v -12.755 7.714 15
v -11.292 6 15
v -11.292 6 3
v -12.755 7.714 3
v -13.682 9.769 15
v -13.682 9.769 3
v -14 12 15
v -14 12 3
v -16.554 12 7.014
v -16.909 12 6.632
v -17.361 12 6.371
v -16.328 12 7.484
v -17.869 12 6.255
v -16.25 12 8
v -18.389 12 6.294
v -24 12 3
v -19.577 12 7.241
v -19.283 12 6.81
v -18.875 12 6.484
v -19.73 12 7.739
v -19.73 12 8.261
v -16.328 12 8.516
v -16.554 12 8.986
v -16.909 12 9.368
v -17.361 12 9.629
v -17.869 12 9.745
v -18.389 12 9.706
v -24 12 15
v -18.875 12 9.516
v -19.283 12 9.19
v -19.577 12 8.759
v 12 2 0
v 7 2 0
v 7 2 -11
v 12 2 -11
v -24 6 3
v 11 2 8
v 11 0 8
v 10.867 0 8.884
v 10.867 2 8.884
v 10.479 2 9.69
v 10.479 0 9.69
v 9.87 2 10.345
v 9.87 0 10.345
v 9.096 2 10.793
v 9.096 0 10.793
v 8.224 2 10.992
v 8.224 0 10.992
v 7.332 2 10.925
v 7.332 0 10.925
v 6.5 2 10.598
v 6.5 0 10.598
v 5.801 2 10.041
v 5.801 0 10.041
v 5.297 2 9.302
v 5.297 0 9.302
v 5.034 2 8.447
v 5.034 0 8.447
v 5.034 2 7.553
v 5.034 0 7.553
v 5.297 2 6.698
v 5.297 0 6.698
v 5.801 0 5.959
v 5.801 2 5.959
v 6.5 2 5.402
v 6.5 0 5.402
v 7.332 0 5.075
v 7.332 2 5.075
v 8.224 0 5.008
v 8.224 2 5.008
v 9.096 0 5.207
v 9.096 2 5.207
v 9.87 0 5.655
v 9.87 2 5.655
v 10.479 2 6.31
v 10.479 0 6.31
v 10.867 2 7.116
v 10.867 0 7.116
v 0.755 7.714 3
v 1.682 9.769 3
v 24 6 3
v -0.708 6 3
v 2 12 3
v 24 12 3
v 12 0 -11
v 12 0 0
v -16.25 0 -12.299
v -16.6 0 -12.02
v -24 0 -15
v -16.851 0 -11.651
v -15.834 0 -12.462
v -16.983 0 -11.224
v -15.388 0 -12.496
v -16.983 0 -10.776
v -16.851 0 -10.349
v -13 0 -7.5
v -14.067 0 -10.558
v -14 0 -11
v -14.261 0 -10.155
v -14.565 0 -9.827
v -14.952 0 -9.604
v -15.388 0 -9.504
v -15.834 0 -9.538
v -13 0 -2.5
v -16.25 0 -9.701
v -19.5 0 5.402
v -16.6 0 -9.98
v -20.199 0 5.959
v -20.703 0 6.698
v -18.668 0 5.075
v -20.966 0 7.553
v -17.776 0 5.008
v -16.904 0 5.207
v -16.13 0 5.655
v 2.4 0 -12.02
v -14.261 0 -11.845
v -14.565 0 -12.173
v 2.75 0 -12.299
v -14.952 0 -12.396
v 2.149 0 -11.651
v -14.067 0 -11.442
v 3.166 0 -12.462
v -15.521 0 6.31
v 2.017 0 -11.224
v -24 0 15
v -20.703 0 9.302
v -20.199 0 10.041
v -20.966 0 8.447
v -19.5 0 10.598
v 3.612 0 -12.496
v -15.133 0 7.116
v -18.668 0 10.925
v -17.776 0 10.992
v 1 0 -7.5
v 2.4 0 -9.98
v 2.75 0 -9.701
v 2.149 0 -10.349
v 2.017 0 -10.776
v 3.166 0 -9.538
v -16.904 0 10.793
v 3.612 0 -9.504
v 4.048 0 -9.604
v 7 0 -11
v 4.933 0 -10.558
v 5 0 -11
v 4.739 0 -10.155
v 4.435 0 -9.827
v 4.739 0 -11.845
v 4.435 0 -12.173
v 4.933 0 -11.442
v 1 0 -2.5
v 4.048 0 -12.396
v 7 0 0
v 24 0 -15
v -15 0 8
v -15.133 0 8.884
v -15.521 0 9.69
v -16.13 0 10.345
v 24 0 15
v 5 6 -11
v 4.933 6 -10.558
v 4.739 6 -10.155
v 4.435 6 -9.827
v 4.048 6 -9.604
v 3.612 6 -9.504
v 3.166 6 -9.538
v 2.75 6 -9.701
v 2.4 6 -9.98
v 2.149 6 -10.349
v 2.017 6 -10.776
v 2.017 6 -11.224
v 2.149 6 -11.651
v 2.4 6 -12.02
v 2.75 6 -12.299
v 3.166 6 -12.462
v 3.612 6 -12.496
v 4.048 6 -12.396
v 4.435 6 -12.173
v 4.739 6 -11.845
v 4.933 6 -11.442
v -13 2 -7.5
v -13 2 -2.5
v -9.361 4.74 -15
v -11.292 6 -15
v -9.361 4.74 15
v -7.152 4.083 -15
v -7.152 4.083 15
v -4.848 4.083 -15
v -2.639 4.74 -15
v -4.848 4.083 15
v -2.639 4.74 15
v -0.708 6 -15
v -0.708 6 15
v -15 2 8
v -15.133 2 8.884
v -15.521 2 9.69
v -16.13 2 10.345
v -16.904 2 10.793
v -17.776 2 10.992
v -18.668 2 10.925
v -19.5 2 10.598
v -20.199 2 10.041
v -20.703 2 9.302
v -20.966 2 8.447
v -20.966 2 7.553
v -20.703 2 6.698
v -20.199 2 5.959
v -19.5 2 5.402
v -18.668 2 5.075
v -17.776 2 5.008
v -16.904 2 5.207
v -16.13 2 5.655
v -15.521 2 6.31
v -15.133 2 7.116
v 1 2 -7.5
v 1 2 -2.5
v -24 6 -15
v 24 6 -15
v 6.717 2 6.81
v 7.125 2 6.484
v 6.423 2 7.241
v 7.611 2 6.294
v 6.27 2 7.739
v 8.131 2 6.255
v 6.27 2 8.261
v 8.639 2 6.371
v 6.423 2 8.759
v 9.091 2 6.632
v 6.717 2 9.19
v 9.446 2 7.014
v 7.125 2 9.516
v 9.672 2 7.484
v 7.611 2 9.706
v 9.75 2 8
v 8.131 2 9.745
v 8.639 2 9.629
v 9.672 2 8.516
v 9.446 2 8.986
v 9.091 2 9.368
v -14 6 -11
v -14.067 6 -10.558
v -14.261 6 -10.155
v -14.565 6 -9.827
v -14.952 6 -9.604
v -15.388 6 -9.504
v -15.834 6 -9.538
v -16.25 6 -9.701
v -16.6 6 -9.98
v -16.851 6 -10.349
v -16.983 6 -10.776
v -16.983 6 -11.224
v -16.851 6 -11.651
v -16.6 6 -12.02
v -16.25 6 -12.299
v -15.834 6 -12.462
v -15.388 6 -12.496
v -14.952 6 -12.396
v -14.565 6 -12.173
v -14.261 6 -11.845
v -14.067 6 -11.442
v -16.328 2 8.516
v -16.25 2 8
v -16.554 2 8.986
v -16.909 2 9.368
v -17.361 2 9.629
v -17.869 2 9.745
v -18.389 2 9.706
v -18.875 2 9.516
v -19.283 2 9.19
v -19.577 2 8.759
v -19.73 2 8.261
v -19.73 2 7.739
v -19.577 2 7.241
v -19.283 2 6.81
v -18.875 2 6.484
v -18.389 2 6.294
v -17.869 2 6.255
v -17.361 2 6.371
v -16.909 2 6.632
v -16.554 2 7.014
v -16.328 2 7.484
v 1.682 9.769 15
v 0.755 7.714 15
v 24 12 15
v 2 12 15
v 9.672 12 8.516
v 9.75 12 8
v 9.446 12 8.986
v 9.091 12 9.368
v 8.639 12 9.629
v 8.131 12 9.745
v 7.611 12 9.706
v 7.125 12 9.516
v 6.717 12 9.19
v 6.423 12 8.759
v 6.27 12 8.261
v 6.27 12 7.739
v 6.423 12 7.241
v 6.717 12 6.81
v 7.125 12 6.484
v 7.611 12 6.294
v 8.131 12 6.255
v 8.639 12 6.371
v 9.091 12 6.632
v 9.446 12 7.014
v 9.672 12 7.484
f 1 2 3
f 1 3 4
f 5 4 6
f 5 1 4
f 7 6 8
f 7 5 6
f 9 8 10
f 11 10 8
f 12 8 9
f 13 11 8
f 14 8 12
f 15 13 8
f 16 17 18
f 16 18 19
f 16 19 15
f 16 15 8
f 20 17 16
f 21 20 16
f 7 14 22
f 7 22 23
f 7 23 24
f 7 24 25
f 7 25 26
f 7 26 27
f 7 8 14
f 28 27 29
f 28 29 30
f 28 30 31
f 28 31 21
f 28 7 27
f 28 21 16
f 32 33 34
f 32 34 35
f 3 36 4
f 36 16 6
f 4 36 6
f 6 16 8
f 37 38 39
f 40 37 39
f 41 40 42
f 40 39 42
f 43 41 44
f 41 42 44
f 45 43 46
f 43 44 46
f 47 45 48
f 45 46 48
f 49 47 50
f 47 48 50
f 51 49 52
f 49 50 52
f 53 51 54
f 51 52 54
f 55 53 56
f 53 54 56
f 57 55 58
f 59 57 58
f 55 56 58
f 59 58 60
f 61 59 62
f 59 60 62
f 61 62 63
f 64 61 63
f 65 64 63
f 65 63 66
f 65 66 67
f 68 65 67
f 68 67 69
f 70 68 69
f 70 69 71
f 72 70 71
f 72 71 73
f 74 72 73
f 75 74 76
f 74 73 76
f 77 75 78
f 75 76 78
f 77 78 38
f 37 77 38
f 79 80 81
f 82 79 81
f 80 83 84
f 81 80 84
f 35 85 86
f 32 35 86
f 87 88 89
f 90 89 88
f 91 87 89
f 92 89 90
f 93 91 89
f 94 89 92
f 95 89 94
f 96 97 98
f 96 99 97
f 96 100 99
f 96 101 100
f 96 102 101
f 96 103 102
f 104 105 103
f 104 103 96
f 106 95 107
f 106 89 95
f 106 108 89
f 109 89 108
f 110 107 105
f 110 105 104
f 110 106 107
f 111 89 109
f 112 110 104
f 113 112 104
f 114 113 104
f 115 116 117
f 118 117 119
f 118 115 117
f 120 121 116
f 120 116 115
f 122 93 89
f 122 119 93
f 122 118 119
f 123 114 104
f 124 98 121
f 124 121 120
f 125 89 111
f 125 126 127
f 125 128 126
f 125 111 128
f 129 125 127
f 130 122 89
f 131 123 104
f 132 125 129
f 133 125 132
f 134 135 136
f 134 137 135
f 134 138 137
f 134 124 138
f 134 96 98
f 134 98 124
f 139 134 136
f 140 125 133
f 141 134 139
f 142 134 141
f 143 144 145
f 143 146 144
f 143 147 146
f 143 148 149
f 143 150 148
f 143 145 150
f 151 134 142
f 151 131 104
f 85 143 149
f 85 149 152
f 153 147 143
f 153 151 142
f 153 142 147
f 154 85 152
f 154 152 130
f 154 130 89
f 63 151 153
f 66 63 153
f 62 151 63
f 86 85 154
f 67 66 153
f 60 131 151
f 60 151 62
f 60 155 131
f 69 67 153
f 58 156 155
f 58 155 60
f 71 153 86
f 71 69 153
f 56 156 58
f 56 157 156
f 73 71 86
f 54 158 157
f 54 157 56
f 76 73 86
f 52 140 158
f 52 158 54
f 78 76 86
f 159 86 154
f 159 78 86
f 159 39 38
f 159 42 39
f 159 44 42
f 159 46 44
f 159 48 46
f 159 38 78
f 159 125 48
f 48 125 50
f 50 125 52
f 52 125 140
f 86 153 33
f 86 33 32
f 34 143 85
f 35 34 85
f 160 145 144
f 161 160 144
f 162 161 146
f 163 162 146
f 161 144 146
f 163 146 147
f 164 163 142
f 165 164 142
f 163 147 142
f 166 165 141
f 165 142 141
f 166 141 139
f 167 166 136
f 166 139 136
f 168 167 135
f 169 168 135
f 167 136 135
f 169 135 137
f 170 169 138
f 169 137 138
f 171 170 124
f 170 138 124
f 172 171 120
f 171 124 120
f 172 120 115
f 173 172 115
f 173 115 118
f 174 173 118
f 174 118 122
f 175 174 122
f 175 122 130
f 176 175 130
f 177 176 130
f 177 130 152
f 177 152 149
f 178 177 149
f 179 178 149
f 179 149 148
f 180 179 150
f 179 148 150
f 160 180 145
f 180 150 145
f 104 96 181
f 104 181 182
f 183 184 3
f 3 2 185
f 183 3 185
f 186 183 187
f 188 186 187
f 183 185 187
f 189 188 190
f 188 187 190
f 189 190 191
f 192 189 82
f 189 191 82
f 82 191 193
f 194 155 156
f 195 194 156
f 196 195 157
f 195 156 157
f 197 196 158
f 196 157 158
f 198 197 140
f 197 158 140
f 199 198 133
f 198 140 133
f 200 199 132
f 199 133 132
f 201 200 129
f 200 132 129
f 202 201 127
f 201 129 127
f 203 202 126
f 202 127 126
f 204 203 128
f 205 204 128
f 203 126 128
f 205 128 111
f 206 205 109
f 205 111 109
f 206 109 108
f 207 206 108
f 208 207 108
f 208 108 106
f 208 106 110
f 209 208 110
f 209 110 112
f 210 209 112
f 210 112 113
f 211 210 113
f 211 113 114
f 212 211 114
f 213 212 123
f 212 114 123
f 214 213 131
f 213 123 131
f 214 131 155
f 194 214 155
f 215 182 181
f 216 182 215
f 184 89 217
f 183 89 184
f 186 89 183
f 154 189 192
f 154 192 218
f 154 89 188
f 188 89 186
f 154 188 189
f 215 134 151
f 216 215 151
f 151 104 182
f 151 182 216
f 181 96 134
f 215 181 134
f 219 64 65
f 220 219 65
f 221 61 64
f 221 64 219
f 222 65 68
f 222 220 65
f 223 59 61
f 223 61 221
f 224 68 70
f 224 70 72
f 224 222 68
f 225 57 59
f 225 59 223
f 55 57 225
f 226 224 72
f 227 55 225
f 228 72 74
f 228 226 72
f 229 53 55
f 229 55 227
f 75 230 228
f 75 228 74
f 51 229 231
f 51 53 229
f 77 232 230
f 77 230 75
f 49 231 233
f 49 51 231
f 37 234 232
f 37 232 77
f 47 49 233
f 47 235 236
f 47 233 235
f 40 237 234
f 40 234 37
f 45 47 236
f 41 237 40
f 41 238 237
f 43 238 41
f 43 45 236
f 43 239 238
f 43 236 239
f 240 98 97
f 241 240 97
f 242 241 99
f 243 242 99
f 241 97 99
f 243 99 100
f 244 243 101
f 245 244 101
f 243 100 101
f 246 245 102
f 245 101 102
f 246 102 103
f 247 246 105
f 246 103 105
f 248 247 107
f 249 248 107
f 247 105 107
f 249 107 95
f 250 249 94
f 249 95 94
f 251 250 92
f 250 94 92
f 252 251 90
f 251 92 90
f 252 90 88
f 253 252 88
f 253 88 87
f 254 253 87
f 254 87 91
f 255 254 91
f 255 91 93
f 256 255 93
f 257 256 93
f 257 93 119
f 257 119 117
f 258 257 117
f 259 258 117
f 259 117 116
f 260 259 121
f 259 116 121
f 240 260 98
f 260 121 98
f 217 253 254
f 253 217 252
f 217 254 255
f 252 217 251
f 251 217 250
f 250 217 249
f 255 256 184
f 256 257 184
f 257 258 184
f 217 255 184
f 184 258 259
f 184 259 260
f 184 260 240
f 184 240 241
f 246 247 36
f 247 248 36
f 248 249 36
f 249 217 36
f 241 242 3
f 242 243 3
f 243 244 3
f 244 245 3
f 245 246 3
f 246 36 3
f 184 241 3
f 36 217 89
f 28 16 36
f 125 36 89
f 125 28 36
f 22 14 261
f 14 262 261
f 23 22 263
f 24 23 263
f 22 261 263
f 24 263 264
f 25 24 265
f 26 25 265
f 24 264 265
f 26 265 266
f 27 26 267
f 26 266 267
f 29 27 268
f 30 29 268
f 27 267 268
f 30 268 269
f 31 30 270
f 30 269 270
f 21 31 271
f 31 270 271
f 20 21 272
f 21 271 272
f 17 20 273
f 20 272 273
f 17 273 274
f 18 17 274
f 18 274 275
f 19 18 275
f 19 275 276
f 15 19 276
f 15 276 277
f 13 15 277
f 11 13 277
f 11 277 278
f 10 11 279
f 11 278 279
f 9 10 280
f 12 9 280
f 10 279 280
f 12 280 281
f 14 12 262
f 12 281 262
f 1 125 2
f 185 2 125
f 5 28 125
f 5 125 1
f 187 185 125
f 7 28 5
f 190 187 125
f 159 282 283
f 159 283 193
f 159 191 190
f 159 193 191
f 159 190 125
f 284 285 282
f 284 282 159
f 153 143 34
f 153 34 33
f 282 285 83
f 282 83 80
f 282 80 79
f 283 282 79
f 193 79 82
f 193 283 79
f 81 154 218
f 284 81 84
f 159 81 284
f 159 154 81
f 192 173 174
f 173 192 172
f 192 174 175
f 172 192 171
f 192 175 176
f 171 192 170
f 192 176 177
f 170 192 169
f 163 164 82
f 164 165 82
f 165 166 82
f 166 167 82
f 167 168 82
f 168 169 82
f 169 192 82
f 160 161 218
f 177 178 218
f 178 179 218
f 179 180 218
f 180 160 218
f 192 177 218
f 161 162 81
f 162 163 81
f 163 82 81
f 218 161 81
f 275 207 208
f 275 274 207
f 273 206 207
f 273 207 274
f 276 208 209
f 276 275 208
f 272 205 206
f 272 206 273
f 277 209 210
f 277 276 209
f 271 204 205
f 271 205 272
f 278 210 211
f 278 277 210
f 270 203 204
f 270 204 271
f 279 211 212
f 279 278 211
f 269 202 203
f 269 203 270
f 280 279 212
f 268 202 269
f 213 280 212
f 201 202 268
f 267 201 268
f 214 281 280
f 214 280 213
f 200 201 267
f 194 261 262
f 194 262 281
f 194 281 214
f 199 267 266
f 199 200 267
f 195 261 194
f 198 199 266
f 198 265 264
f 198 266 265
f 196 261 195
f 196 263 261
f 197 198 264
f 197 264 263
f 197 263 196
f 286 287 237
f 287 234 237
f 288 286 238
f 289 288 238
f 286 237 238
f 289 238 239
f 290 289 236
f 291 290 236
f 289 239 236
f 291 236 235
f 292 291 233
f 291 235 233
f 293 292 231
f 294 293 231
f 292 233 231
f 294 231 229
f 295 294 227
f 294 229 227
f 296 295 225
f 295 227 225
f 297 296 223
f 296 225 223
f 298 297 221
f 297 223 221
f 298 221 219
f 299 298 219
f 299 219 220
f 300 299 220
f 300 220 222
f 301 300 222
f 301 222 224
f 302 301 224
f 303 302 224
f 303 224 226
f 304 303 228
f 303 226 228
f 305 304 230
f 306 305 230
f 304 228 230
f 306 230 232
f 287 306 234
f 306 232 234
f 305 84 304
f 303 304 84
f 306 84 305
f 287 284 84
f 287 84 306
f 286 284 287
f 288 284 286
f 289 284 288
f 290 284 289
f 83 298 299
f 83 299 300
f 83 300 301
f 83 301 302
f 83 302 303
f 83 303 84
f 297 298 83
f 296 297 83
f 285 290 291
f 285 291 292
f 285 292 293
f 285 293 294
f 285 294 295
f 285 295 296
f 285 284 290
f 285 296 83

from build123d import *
from build123d import SkipClean  # not in build123d's __all__

# Parameters (mm, degrees)
F0_W     = 48
F0_H     = 30
F0_R     = 1.5
F0_W_2   = 14
F0_H_2   = 5
F0_W_3   = 5
F0_H_3   = 11
F0_R_2   = 3
F0_R_3   = 1.75
F1_DEPTH = 6
F2_DEPTH = 2
F5_DEPTH = 12
F6_DEPTH = 12.001
F7_DEPTH = 30.001


with BuildPart() as f1:
    # F0 (on Front) → F1 (new body)
    with BuildSketch(Plane.XZ):
        Rectangle(F0_W, F0_H)
        with Locations((-15.5, -11)):
            Circle(F0_R, mode=Mode.SUBTRACT)
        with Locations((-6, -5)):
            Rectangle(F0_W_2, F0_H_2, mode=Mode.SUBTRACT)
        with Locations((3.5, -11)):
            Circle(F0_R, mode=Mode.SUBTRACT)
        with Locations((9.5, -5.5)):
            Rectangle(F0_W_3, F0_H_3, mode=Mode.SUBTRACT)
        with Locations((-18, 8)):
            Circle(F0_R_2, mode=Mode.SUBTRACT)
        with Locations((8, 8)):
            Circle(F0_R_2, mode=Mode.SUBTRACT)
        with Locations((-6, -5)):
            Rectangle(F0_W_2, F0_H_2)
        with Locations((9.5, -5.5)):
            Rectangle(F0_W_3, F0_H_3)
        with Locations((8, 8)):
            Circle(F0_R_2)
        with Locations((8, 8)):
            Circle(F0_R_3, mode=Mode.SUBTRACT)
        with Locations((-18, 8)):
            Circle(F0_R_2)
        with Locations((-18, 8)):
            Circle(F0_R_3, mode=Mode.SUBTRACT)
    extrude(amount=-F1_DEPTH)

    # F0 (on Front) → F2 (cut)
    with BuildSketch(Plane.XZ):
        with Locations((9.5, -5.5)):
            Rectangle(F0_W_3, F0_H_3)
        with Locations((-6, -5)):
            Rectangle(F0_W_2, F0_H_2)
        with Locations((-18, 8)):
            Circle(F0_R_2)
        with Locations((-18, 8)):
            Circle(F0_R_3, mode=Mode.SUBTRACT)
        with Locations((8, 8)):
            Circle(F0_R_2)
        with Locations((8, 8)):
            Circle(F0_R_3, mode=Mode.SUBTRACT)
    extrude(amount=-F2_DEPTH, mode=Mode.SUBTRACT)

    # F4 (on face) → F5 (join)
    with BuildSketch(Plane.XY.offset(15)):
        with BuildLine():
            Line((-24, 12), (-24, 6))
            Line((-24, 6), (-11.2915026221, 6))
            ThreePointArc((-11.2915026221, 6), (-13.2915026221, 8.7084973779), (-14, 12))
            Line((-14, 12), (-24, 12))
        make_face()
        with BuildLine():
            ThreePointArc((2, 12), (1.2915026221, 8.7084973779), (-0.7084973779, 6))
            Line((-0.7084973779, 6), (24, 6))
            Line((24, 6), (24, 12))
            Line((24, 12), (2, 12))
        make_face()
    extrude(amount=-F5_DEPTH)

    # F0 (on Front) → F6 (cut, through all)
    with BuildSketch(Plane.XZ):
        with Locations((-18, 8)):
            Circle(F0_R_3)
        with Locations((8, 8)):
            Circle(F0_R_3)
    extrude(amount=-F6_DEPTH, mode=Mode.SUBTRACT)

    # F4 (on face) → F7 (cut, through all)
    with BuildSketch(Plane.XY.offset(15)):
        with BuildLine():
            Line((-0.7084973779, 6), (-11.2915026221, 6))
            ThreePointArc((-11.2915026221, 6), (-6, 4), (-0.7084973779, 6))
        make_face()
    with SkipClean():  # cleaning this boolean's faces spoils the solid; the shape is the same uncleaned
        extrude(amount=-F7_DEPTH, mode=Mode.SUBTRACT)


solid = f1.part
